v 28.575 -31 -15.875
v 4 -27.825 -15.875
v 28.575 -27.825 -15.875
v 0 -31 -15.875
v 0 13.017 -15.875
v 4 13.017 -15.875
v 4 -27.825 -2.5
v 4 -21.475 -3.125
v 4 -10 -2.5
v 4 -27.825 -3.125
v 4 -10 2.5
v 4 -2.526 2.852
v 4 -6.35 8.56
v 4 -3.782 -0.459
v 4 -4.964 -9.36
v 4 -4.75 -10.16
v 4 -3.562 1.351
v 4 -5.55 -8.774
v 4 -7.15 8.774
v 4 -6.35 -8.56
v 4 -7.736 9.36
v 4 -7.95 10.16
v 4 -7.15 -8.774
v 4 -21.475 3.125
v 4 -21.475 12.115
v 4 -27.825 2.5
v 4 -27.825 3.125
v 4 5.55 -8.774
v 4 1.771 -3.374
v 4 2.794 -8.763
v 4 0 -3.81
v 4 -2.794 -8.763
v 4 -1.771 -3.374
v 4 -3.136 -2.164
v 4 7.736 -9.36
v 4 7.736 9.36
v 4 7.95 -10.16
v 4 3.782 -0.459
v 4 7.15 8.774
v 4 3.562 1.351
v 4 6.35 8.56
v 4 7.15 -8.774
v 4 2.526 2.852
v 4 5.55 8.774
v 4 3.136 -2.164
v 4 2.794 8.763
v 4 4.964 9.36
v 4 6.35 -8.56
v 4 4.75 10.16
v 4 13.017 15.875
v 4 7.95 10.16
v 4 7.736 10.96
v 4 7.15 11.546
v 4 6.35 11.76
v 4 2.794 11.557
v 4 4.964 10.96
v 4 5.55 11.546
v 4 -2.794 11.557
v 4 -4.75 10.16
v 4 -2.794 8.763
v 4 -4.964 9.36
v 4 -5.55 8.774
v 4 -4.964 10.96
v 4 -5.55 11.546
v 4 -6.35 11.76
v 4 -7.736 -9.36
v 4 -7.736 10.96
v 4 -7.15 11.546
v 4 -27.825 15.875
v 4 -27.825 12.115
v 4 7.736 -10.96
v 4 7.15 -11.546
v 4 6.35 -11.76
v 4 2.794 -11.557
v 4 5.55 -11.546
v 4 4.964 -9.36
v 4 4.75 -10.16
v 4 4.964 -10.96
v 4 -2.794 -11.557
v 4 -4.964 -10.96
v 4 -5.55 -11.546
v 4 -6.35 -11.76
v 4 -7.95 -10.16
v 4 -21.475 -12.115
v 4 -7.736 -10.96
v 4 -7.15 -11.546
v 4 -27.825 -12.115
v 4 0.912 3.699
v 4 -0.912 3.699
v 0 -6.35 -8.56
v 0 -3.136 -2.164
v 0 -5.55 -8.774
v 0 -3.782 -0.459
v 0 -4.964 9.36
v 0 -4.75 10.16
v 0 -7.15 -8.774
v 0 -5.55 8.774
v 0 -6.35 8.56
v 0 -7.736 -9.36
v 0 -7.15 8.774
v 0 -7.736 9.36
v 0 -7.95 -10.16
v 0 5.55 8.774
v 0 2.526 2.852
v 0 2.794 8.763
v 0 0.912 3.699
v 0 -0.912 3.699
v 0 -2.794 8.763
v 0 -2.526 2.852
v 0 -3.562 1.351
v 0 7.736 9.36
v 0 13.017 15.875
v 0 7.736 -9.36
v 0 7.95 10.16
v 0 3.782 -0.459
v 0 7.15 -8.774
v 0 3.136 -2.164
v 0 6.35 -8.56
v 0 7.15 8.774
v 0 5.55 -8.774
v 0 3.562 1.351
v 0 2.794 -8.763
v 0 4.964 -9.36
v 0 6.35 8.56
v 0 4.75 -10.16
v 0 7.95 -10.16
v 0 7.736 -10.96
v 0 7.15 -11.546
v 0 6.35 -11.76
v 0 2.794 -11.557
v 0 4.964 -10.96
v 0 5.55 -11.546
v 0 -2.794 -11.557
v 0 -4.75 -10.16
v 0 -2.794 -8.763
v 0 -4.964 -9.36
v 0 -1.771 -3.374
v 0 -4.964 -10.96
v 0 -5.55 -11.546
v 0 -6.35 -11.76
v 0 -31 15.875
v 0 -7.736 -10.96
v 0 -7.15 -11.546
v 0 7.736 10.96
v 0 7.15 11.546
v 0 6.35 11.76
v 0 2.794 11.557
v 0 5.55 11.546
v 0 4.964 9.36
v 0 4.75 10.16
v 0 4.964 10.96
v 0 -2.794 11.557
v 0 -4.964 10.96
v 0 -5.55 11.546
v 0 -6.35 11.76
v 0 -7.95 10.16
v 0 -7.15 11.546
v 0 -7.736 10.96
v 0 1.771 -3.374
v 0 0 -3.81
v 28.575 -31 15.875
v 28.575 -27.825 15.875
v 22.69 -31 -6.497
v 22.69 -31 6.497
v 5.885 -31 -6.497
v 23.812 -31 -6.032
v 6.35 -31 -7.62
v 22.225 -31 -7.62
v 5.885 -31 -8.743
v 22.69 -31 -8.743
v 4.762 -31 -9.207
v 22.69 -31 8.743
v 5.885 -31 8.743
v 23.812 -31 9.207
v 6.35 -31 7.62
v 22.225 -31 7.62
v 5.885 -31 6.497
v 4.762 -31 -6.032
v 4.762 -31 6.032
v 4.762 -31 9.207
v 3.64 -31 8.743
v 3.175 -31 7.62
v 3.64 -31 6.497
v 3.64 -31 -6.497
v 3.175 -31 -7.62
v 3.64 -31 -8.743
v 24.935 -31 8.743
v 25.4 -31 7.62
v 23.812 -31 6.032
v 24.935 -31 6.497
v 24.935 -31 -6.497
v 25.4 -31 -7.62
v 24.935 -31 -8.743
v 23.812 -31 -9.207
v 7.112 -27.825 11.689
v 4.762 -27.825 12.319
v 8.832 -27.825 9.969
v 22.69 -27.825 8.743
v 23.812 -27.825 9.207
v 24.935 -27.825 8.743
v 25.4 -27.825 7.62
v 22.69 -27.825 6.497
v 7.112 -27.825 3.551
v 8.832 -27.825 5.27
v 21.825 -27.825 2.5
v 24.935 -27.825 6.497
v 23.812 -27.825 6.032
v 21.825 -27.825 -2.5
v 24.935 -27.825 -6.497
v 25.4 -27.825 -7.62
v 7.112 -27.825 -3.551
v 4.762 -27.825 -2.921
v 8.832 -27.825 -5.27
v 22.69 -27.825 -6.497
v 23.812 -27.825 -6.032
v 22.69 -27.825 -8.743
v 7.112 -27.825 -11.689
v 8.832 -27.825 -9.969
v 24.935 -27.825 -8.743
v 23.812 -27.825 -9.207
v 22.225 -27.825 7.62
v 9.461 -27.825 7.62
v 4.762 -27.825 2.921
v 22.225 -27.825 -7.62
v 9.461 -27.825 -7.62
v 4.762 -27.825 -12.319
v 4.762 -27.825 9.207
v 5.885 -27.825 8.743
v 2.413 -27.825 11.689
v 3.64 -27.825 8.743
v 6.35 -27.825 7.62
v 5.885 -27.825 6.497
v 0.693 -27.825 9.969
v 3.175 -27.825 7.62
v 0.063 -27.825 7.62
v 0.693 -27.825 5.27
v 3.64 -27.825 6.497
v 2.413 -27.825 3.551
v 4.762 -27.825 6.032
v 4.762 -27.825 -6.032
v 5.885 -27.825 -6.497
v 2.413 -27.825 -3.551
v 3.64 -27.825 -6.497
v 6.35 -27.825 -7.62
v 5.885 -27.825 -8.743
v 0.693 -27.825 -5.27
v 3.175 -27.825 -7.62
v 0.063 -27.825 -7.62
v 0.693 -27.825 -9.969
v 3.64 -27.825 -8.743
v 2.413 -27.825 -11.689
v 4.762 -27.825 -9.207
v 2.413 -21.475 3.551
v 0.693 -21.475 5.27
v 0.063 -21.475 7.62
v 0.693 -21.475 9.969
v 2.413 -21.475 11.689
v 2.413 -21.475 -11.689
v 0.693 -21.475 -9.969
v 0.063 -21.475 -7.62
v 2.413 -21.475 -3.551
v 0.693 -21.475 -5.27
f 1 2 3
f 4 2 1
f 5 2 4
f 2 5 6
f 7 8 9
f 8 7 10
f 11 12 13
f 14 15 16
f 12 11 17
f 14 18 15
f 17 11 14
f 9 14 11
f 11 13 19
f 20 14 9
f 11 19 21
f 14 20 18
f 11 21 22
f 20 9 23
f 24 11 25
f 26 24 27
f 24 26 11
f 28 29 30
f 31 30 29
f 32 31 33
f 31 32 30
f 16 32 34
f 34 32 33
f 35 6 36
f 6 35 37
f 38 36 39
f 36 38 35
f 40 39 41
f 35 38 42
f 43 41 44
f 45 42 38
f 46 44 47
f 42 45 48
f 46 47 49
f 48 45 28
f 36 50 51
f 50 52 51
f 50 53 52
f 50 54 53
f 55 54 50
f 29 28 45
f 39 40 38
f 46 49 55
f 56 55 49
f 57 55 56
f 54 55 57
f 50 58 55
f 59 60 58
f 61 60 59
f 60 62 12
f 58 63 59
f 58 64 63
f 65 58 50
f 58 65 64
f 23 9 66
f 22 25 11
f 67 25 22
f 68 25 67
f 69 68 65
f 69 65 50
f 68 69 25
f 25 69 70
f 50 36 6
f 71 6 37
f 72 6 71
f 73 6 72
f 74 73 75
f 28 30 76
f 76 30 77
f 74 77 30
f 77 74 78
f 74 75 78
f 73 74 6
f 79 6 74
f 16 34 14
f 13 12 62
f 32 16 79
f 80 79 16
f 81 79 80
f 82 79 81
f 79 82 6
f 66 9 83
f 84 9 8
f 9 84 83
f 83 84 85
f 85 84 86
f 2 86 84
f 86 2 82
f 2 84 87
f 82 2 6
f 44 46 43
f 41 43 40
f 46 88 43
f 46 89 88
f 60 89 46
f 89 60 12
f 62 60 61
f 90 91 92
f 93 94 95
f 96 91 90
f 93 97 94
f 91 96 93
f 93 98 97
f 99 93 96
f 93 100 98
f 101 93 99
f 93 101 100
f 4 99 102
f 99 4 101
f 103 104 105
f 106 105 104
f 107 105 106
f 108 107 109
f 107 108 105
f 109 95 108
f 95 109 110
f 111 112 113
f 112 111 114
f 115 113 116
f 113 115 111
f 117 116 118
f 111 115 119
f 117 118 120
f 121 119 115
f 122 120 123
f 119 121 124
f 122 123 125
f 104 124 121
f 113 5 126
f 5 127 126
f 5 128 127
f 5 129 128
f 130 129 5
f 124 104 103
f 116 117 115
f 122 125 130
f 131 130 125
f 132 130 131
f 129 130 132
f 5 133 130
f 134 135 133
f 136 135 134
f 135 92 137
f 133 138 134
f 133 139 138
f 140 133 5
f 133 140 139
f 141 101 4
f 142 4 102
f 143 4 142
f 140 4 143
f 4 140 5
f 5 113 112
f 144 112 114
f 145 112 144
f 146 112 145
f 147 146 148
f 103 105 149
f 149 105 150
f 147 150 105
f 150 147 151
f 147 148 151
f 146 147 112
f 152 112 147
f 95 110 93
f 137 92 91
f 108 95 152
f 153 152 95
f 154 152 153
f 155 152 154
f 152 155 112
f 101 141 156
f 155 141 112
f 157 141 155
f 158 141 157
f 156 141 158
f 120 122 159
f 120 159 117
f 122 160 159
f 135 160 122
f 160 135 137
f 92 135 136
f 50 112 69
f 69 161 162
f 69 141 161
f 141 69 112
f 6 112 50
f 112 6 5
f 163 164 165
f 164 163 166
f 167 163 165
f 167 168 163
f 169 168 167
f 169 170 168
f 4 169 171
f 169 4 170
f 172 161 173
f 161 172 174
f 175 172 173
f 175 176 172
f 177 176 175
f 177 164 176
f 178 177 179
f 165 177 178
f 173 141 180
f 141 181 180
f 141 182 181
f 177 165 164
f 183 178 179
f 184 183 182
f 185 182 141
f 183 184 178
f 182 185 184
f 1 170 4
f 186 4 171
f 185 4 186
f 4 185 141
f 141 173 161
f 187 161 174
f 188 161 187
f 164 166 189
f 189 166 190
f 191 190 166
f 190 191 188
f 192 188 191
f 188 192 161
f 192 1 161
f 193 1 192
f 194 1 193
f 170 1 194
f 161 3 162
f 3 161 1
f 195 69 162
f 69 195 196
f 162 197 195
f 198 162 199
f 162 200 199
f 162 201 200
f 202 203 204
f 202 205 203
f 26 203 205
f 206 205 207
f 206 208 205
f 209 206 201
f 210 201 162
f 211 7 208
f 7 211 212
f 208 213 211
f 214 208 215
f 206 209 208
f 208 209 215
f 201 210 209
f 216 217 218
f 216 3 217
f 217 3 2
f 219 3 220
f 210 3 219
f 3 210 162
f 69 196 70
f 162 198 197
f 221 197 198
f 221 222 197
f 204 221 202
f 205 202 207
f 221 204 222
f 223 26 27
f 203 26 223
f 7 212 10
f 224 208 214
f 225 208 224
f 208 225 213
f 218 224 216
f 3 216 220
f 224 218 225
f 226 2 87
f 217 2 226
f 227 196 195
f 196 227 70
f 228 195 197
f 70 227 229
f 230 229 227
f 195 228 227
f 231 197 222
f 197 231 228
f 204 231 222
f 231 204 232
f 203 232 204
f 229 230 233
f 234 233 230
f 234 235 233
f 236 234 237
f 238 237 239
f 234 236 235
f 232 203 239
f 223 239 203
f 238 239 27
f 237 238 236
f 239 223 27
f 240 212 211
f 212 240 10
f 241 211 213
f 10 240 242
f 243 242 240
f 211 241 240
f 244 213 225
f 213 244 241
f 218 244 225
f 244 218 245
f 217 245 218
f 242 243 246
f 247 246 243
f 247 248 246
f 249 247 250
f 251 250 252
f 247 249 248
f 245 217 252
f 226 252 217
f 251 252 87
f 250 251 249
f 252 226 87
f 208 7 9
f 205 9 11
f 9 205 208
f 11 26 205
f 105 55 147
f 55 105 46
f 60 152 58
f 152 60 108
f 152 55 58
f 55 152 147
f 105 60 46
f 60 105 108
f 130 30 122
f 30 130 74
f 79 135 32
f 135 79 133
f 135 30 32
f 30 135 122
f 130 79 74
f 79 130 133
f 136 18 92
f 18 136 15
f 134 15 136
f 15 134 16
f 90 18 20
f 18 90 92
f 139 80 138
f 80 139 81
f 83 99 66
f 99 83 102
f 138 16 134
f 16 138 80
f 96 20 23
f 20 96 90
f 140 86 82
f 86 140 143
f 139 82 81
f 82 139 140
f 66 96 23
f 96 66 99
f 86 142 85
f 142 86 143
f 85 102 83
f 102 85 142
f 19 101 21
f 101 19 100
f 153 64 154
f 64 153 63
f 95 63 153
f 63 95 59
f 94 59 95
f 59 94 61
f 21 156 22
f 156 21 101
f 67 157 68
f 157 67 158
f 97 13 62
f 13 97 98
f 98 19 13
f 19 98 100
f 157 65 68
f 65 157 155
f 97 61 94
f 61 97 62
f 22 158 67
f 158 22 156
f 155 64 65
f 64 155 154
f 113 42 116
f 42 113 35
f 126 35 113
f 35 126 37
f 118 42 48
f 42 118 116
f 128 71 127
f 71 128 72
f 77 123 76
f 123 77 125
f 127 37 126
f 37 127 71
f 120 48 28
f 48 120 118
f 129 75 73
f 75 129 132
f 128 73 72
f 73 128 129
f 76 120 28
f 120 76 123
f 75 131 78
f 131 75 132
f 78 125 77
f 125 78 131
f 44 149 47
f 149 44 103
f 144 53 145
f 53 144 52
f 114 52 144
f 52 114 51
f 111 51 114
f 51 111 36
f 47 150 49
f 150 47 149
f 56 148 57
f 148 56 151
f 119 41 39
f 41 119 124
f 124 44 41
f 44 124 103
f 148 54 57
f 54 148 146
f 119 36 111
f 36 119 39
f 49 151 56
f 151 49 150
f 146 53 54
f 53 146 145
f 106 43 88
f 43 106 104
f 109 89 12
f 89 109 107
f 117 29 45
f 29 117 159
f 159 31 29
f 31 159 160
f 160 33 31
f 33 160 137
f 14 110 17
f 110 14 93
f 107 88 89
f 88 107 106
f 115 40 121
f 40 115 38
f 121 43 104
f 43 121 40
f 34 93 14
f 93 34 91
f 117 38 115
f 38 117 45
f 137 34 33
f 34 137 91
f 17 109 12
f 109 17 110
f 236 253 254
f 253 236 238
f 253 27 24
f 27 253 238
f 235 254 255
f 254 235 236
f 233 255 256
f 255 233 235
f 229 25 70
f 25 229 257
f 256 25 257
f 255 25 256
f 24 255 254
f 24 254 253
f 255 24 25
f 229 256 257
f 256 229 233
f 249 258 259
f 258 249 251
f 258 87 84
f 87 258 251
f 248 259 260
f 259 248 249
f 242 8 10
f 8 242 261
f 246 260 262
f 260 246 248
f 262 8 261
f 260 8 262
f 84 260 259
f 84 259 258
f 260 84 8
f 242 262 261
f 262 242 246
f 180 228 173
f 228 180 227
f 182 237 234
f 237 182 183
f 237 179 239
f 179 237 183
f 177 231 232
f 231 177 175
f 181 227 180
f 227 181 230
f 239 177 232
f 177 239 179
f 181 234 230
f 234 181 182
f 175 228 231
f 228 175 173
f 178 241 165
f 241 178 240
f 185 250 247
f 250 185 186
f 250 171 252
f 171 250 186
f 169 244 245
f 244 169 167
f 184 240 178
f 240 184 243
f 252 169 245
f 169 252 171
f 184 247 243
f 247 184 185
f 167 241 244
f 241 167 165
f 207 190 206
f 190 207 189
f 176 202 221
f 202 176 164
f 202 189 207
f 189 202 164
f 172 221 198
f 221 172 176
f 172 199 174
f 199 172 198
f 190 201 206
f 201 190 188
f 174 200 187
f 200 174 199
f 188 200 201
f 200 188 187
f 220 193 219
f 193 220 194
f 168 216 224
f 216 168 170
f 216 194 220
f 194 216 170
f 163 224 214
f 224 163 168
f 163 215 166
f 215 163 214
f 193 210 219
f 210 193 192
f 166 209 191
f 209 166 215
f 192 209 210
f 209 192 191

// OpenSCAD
// file: utils.scad
//
// general utility functions for OpenSCAD
//
function inch(in) = 25.4*in;
// main file
// ring mount for components
// Copyright (C) 2016, Theodore C Yapo

use <utils.scad>;


ring_length = 10;
//center_height = 14.5;
center_height = 31;
outer_d = 2*center_height / cos(30);
ring_thickness = 4;
inner_d = outer_d - 2*ring_thickness;
screw_spacing = inch(0.6);
base_width = inch(1.25);
base_thickness = inch(0.125);
base_length = inch(1.125);

nut_block_thickness = 6;
nut_block_width = 12;

// recesses for #4-40 hex nuts
nut_d = inch(0.25) / cos(30) + 0.5;
nut_h = 3;

set_screw_d = inch(0.125);

epsilon = 1;


board_width = inch(0.775);
board_length = inch(1.075);
board_thickness = 1.6;
board_hole_d = inch(0.126);
board_hole_offset = inch(0.1375);
board_center = 12.5;
LED_aperture = 12;
header_l = inch(0.11);
header_w = inch(0.22);

face_thickness = 4;
face_height = center_height + base_thickness + board_width/2;

module board_holes(height, fn, header_holes = true)
{
  // mounting holes
  translate([-board_width/2 + board_hole_offset,
             -board_length/2 + board_hole_offset,
             -epsilon]){
    cylinder($fn=fn, d=board_hole_d, h=height);
  }
  // mounting holes
  translate([-board_width/2 + board_hole_offset,
             +board_length/2 - board_hole_offset,
             -epsilon]){
    cylinder($fn=fn, d=board_hole_d, h=height);
  }
  // mounting holes
  translate([+board_width/2 - board_hole_offset,
             -board_length/2 + board_hole_offset,
             -epsilon]){
    cylinder($fn=fn, d=board_hole_d, h=height);
  }
  // mounting holes
  translate([+board_width/2 - board_hole_offset,
             +board_length/2 - board_hole_offset,
             -epsilon]){
    cylinder($fn=fn, d=board_hole_d, h=height);
  }
  if (header_holes){
    // header clearance hole
    translate([-header_w/2,
               +board_length/2 - board_hole_offset - header_l/2,
               -epsilon]){
      cube([header_w, header_l, height]);
    }
    // header clearance hole
    translate([-header_w/2,
               -board_length/2 + board_hole_offset - header_l/2,
               -epsilon]){
      cube([header_w, header_l, height]);
    }
  }
}

module LED_mount(){
  difference(){
    union(){
      // face
      translate([-base_width/2, -center_height, 0]){
        cube([base_width, face_height, face_thickness]);
      }

      // base
      translate([-base_width/2, -center_height, 0]){
        cube([base_width, base_thickness, base_length]);
      }

      // brace
      brace_len = 25;
      brace_thickness = 5;
      translate([brace_thickness/2,
                 -center_height+brace_len,
                  0])
      rotate([0, -90, 0])
      linear_extrude(height = brace_thickness){
        polygon([[0, 0], [0, -brace_len], [brace_len, -brace_len]]);
      }
    }

    // required holes for board
    rotate([0, 0, 90]){
      board_holes(face_thickness+2*epsilon, 12, true);
    }
    translate([0, 0, -epsilon]){
      cylinder($fn=13, d = inch(0.3), h = face_thickness+2*epsilon);
    }


    // mounting screw clearance slots
    translate([-inch(0.6)/2,
               -center_height + base_thickness,
               (base_length - inch(0.75))/2]){
      rotate([-90, 0, 0]){
        cylinder($fn=12, d = inch(0.37), h = inch(0.25));
      }
    }
    translate([+inch(0.6)/2,
               -center_height + base_thickness,
               (base_length - inch(0.75))/2]){
      rotate([-90, 0, 0]){
        cylinder($fn=12, d = inch(0.37), h = inch(0.25));
      }
    }
    
    
    // mounting screw holes
    translate([-inch(0.6)/2,
               -center_height-epsilon,
               (base_length - inch(0.75))/2]){
      rotate([-90, 0, 0]){
        cylinder($fn=8, d = inch(0.125), h = inch(0.25));
      }
    }
    translate([+inch(0.6)/2,
               -center_height-epsilon,
               (base_length - inch(0.75))/2]){
      rotate([-90, 0, 0]){
        cylinder($fn=8, d = inch(0.125), h = inch(0.25));
      }
    }
    translate([-inch(0.6)/2,
               -center_height - epsilon,
               base_length - (base_length - inch(0.75))/2]){
      rotate([-90, 0, 0]){
        cylinder($fn=8, d = inch(0.125), h = inch(0.25));
      }
    }
    translate([+inch(0.6)/2,
               -center_height - epsilon,
               base_length - (base_length - inch(0.75))/2]){
      rotate([-90, 0, 0]){
        cylinder($fn=8, d = inch(0.125), h = inch(0.25));
      }
    }
  }  
}


led_d = 5.2;
led_lip_d = 6.5;
led_lip_l = 2;
aperture_d = 5.4;
//barrel_d = mount_height;
barrel_l = 8;

module led()
{
  color("red"){
    sphere($fn=27, d=5);
    cylinder($fn=27, d = 5, h = 5);
    translate([0, 0, 5]){
      cylinder($fn=27, d = 6, h = 1);
    }
  }
  color([0.75, 0.75, 0.75]){
    translate([+0.05*25.4, 0, 0]){
      rotate([0, 0, 45]){
        cylinder($fn=4, d=0.75, h = 15);
      }
    }
    translate([-0.05*25.4, 0, 0]){
      rotate([0, 0, 45]){
        cylinder($fn=4, d=0.75, h = 20);
      }
    }
  }
  
}

module board(header_holes=false)
{
  difference(){
    translate([-board_width/2, -board_length/2, 0]){  
      cube([board_width, board_length, board_thickness]);
    }
    board_holes(board_thickness + 2*epsilon, 13, header_holes);
  }
}

module printing_layout()
{
  rotate([0, 90, 0]){
    LED_mount();
  }
}

module LED_mount_assembly()
{
  LED_mount();
  translate([0, 0, -10]){
    rotate([0, 0, 90]){
      color("purple") board();
    }
    translate([0, 0, -6]){
      led();
    }
  }

}


printing_layout();

//LED_mount_assembly();
